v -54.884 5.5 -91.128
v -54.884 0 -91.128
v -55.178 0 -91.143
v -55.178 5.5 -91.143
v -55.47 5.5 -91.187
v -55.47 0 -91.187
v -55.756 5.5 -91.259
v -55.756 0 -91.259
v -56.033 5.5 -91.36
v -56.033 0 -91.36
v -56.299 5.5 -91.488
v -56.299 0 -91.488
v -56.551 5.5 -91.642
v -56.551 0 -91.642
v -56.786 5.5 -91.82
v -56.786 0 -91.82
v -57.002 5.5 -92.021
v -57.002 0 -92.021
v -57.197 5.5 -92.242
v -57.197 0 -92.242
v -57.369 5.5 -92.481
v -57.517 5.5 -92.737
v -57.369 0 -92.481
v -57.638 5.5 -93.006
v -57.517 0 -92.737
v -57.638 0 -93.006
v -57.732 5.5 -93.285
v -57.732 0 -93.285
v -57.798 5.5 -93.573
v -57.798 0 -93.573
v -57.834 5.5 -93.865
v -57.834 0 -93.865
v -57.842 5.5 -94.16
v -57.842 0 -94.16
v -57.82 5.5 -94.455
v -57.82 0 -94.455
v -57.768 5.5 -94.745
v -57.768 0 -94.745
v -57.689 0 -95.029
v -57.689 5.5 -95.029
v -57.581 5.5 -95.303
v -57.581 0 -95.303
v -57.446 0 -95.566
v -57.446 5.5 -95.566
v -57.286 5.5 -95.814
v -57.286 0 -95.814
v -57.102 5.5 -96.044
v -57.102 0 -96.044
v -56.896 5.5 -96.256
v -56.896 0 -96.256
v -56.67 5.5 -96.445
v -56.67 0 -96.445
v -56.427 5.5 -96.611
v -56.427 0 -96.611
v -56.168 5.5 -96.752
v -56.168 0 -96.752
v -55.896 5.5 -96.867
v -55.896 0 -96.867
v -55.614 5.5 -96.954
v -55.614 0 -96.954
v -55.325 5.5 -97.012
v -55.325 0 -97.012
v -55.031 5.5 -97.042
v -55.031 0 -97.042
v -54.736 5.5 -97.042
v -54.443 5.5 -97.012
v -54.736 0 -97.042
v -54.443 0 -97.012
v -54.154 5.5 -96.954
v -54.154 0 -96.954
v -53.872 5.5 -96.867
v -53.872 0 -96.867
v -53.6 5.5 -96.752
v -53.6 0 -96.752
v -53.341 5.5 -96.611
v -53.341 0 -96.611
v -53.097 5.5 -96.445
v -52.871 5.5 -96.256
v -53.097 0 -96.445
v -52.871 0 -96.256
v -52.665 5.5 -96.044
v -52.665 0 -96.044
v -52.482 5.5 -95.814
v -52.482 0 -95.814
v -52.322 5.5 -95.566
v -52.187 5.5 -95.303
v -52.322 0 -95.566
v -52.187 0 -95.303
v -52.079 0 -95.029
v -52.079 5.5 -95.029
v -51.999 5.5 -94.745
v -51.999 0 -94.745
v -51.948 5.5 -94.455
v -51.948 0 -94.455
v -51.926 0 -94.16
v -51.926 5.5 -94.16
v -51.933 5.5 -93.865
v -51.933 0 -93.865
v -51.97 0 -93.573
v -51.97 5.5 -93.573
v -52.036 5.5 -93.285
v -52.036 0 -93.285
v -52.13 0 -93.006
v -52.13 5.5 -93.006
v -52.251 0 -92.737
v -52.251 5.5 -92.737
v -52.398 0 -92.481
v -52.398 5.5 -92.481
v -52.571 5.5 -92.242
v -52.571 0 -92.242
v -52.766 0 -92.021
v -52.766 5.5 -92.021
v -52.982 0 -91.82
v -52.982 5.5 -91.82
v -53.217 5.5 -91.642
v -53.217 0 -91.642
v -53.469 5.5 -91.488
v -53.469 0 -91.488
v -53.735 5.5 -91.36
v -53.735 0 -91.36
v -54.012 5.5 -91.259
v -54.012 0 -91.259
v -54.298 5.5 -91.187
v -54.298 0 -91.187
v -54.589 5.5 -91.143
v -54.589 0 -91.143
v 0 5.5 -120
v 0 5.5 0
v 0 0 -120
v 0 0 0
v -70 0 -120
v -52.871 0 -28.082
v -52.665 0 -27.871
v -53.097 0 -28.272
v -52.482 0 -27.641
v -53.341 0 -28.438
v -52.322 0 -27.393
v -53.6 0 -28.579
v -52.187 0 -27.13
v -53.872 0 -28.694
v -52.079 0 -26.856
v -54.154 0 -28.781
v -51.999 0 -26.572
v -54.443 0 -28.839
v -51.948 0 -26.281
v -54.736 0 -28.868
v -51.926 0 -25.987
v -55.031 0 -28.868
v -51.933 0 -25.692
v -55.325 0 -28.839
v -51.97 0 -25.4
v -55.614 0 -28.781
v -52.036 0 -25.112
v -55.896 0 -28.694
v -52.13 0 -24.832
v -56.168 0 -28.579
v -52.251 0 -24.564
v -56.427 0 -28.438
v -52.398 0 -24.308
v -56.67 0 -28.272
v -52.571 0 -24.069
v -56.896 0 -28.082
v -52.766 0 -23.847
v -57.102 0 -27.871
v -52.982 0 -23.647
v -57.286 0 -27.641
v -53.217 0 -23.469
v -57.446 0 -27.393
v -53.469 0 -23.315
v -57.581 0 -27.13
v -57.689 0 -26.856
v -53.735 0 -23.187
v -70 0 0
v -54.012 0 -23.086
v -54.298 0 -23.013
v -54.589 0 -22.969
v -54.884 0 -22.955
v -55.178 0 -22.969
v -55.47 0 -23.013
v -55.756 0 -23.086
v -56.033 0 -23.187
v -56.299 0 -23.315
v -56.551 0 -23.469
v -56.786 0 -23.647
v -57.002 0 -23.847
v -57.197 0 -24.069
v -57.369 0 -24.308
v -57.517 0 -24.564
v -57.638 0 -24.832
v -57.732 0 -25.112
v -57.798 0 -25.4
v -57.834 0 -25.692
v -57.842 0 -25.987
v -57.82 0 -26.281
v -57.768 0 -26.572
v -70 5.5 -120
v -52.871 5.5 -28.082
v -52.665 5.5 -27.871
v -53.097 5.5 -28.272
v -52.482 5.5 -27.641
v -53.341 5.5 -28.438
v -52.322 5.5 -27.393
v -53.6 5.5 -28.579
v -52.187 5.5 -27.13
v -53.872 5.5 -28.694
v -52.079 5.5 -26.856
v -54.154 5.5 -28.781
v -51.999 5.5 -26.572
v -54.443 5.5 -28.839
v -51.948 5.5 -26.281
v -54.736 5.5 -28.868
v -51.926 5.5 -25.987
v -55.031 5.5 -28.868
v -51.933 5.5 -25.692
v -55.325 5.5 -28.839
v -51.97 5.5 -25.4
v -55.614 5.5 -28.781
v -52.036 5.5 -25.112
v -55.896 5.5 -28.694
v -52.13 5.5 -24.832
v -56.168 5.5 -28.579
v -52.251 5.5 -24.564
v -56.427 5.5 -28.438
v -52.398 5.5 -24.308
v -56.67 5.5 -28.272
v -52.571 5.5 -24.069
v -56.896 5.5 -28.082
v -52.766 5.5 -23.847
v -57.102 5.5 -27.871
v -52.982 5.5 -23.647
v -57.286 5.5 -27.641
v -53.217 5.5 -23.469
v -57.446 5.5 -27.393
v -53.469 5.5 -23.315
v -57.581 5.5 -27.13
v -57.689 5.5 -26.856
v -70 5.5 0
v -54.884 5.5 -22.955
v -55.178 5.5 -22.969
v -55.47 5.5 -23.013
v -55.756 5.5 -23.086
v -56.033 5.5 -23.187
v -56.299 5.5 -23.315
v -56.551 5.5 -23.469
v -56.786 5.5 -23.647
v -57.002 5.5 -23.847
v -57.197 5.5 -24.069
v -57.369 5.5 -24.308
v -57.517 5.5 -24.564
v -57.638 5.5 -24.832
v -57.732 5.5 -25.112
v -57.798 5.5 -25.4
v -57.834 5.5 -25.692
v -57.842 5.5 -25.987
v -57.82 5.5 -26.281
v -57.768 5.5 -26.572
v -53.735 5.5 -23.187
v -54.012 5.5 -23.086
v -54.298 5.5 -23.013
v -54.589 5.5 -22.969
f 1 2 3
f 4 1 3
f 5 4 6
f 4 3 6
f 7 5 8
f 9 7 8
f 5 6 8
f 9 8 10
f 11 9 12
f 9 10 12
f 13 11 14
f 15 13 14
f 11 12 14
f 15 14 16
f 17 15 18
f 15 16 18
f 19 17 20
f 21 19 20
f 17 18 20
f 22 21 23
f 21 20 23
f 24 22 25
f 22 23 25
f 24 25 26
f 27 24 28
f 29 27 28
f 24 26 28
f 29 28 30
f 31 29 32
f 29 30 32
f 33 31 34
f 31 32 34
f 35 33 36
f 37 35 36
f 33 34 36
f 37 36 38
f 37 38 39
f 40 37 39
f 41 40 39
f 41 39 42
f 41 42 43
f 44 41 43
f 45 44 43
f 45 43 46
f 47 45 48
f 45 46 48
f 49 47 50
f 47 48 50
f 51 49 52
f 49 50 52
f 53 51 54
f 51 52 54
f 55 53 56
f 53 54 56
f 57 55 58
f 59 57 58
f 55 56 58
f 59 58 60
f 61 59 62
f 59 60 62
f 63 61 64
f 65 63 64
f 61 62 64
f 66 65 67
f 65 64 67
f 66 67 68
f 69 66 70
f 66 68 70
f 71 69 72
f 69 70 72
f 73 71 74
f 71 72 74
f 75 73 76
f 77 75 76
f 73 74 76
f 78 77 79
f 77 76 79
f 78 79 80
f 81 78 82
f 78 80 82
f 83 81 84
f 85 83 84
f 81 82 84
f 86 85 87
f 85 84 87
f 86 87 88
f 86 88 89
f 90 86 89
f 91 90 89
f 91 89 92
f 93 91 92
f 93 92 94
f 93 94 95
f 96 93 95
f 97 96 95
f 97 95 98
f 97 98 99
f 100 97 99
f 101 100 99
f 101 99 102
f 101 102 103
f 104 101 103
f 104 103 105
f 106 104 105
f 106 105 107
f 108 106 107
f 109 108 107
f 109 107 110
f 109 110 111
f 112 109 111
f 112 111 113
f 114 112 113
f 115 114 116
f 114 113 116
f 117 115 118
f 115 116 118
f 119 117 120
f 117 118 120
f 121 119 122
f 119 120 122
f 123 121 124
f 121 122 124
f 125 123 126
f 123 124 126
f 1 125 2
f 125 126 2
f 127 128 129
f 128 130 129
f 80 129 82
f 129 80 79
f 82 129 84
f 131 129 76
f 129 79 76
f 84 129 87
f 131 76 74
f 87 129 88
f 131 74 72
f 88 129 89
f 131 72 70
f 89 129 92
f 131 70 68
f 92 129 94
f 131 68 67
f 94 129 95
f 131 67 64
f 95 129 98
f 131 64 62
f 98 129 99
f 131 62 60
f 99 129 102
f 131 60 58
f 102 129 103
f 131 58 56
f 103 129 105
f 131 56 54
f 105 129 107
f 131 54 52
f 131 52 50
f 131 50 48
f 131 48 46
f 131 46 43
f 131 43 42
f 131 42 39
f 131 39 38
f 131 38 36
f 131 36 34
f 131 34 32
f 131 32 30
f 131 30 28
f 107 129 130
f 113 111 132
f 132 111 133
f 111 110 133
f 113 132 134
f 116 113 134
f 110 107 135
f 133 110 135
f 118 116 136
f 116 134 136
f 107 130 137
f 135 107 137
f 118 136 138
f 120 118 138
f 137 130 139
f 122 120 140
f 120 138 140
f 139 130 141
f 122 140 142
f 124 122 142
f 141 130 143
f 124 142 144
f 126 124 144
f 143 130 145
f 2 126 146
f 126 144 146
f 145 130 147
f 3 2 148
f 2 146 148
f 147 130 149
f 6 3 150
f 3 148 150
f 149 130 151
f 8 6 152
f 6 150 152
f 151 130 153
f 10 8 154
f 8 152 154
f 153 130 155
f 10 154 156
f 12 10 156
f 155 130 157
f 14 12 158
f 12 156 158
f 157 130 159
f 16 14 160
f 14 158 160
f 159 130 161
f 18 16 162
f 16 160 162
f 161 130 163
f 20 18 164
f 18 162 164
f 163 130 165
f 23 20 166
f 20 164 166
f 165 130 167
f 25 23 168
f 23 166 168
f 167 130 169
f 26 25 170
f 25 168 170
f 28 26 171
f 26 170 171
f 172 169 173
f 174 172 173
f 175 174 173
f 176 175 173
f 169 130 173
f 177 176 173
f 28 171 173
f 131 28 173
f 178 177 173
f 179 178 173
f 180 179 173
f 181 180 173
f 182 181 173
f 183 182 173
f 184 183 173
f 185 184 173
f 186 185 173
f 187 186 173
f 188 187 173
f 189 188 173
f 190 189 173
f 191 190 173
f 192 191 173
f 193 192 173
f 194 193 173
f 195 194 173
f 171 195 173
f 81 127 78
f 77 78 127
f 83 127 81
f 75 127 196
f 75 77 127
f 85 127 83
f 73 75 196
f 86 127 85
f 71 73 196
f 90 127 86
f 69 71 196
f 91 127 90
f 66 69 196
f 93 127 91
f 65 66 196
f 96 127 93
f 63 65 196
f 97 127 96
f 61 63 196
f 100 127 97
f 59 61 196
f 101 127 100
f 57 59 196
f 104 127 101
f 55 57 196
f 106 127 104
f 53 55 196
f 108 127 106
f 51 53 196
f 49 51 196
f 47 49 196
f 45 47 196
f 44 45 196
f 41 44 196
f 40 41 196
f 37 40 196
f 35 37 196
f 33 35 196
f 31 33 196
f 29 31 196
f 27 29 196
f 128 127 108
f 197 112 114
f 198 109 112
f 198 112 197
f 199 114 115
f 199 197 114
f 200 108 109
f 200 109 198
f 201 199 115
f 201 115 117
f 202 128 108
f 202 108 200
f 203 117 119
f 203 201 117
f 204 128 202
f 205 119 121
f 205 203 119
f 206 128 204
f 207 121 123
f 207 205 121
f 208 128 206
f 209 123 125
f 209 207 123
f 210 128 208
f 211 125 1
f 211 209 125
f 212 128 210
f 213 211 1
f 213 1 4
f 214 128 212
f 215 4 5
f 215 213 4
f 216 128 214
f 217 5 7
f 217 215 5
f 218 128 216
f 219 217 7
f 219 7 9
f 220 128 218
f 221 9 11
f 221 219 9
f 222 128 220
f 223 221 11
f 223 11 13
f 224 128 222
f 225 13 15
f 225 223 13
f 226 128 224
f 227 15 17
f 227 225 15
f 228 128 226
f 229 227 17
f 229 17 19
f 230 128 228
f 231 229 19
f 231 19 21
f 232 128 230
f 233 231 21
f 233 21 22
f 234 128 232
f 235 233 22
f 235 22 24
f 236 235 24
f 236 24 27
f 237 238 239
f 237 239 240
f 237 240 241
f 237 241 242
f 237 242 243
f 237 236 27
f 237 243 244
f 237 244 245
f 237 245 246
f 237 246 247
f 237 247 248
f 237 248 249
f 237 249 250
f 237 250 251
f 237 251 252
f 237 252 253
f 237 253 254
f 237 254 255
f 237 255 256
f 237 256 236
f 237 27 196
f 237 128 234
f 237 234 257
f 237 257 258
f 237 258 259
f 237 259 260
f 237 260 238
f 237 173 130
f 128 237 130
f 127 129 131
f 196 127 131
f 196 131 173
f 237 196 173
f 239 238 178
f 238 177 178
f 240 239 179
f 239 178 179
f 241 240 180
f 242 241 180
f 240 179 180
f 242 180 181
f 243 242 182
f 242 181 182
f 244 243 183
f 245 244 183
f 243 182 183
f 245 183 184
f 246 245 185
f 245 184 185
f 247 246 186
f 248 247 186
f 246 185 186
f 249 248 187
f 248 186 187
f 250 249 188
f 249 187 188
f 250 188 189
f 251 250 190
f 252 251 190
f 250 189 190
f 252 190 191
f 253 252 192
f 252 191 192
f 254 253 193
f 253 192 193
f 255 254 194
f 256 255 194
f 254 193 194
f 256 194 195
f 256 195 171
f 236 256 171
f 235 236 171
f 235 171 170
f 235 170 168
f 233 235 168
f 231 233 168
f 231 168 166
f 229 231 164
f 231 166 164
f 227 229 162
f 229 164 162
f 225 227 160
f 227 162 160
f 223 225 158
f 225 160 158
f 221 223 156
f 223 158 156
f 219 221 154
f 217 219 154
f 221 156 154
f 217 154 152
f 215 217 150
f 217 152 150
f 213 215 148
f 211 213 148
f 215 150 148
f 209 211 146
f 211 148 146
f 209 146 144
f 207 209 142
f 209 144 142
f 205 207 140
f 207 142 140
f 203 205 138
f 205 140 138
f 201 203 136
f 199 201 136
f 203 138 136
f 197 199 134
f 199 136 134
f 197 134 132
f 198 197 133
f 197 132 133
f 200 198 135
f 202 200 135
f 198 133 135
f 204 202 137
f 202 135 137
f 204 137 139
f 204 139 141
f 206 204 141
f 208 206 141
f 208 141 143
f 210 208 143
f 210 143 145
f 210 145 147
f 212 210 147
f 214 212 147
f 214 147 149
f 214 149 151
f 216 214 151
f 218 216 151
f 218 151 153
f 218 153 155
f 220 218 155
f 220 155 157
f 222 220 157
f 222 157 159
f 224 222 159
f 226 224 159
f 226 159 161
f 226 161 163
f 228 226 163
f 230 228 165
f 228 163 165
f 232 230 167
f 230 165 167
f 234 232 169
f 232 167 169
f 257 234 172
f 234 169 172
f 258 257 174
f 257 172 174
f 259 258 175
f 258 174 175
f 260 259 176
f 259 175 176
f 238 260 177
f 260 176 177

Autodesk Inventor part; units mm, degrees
ref_plane "YZ Plane" through (0, 0, 0) normal (1, 0, 0) x (0, 1, 0)
ref_plane "XZ Plane" through (0, 0, 0) normal (0, 1, 0) x (-1, 0, 0)
ref_plane "XY Plane" through (0, 0, 0) normal (0, 0, 1) x (1, 0, 0)
sketch "Sketch1" plane through (0, 0, 0) normal (0, 1, 0) x (-1, 0, 0)
  line L0 (0, 0) -> (0, -120)
  line L1 (0, -120) -> (70, -120)
  line L2 (70, -120) -> (70, 0)
  line L3 (70, 0) -> (0, 0)
  line L4 (70, 0) -> (0, 0)
  dimension "d0" = 120
  dimension "d1" = 70
extrude "Extrusion1" add sketch "Sketch1" along normal blind 5.5
sketch "Sketch2" plane through (0, 5.5, 0) normal (0, 1, 0) x (1, 0, 0)
  line L0 (0, 120) -> (-70, 120) construction
  line L1 (0, 0) -> (0, 120) construction
  line L2 (-70, 120) -> (0, 0) construction
  line L3 (-70, 0) -> (0, 0) construction
  line L4 (-70, 0) -> (0, 120) construction
  line L5 (-70, 120) -> (-54.8839, 94.0866) construction
  line L6 (-70, 0) -> (-54.8839, 25.9134) construction
  dimension "d4" = 30
  dimension "d5" = 30
hole "Hole1" at (-54.8839, 5.5, -94.0866) at (-54.8839, 5.5, -25.9134) direction (0, -1, 0) diameter 5.9175 depth 19.1 tip angle 118 thread size "M7x1" class "6H" standard "ANSI Metric M Profile"
properties part number "HL"
